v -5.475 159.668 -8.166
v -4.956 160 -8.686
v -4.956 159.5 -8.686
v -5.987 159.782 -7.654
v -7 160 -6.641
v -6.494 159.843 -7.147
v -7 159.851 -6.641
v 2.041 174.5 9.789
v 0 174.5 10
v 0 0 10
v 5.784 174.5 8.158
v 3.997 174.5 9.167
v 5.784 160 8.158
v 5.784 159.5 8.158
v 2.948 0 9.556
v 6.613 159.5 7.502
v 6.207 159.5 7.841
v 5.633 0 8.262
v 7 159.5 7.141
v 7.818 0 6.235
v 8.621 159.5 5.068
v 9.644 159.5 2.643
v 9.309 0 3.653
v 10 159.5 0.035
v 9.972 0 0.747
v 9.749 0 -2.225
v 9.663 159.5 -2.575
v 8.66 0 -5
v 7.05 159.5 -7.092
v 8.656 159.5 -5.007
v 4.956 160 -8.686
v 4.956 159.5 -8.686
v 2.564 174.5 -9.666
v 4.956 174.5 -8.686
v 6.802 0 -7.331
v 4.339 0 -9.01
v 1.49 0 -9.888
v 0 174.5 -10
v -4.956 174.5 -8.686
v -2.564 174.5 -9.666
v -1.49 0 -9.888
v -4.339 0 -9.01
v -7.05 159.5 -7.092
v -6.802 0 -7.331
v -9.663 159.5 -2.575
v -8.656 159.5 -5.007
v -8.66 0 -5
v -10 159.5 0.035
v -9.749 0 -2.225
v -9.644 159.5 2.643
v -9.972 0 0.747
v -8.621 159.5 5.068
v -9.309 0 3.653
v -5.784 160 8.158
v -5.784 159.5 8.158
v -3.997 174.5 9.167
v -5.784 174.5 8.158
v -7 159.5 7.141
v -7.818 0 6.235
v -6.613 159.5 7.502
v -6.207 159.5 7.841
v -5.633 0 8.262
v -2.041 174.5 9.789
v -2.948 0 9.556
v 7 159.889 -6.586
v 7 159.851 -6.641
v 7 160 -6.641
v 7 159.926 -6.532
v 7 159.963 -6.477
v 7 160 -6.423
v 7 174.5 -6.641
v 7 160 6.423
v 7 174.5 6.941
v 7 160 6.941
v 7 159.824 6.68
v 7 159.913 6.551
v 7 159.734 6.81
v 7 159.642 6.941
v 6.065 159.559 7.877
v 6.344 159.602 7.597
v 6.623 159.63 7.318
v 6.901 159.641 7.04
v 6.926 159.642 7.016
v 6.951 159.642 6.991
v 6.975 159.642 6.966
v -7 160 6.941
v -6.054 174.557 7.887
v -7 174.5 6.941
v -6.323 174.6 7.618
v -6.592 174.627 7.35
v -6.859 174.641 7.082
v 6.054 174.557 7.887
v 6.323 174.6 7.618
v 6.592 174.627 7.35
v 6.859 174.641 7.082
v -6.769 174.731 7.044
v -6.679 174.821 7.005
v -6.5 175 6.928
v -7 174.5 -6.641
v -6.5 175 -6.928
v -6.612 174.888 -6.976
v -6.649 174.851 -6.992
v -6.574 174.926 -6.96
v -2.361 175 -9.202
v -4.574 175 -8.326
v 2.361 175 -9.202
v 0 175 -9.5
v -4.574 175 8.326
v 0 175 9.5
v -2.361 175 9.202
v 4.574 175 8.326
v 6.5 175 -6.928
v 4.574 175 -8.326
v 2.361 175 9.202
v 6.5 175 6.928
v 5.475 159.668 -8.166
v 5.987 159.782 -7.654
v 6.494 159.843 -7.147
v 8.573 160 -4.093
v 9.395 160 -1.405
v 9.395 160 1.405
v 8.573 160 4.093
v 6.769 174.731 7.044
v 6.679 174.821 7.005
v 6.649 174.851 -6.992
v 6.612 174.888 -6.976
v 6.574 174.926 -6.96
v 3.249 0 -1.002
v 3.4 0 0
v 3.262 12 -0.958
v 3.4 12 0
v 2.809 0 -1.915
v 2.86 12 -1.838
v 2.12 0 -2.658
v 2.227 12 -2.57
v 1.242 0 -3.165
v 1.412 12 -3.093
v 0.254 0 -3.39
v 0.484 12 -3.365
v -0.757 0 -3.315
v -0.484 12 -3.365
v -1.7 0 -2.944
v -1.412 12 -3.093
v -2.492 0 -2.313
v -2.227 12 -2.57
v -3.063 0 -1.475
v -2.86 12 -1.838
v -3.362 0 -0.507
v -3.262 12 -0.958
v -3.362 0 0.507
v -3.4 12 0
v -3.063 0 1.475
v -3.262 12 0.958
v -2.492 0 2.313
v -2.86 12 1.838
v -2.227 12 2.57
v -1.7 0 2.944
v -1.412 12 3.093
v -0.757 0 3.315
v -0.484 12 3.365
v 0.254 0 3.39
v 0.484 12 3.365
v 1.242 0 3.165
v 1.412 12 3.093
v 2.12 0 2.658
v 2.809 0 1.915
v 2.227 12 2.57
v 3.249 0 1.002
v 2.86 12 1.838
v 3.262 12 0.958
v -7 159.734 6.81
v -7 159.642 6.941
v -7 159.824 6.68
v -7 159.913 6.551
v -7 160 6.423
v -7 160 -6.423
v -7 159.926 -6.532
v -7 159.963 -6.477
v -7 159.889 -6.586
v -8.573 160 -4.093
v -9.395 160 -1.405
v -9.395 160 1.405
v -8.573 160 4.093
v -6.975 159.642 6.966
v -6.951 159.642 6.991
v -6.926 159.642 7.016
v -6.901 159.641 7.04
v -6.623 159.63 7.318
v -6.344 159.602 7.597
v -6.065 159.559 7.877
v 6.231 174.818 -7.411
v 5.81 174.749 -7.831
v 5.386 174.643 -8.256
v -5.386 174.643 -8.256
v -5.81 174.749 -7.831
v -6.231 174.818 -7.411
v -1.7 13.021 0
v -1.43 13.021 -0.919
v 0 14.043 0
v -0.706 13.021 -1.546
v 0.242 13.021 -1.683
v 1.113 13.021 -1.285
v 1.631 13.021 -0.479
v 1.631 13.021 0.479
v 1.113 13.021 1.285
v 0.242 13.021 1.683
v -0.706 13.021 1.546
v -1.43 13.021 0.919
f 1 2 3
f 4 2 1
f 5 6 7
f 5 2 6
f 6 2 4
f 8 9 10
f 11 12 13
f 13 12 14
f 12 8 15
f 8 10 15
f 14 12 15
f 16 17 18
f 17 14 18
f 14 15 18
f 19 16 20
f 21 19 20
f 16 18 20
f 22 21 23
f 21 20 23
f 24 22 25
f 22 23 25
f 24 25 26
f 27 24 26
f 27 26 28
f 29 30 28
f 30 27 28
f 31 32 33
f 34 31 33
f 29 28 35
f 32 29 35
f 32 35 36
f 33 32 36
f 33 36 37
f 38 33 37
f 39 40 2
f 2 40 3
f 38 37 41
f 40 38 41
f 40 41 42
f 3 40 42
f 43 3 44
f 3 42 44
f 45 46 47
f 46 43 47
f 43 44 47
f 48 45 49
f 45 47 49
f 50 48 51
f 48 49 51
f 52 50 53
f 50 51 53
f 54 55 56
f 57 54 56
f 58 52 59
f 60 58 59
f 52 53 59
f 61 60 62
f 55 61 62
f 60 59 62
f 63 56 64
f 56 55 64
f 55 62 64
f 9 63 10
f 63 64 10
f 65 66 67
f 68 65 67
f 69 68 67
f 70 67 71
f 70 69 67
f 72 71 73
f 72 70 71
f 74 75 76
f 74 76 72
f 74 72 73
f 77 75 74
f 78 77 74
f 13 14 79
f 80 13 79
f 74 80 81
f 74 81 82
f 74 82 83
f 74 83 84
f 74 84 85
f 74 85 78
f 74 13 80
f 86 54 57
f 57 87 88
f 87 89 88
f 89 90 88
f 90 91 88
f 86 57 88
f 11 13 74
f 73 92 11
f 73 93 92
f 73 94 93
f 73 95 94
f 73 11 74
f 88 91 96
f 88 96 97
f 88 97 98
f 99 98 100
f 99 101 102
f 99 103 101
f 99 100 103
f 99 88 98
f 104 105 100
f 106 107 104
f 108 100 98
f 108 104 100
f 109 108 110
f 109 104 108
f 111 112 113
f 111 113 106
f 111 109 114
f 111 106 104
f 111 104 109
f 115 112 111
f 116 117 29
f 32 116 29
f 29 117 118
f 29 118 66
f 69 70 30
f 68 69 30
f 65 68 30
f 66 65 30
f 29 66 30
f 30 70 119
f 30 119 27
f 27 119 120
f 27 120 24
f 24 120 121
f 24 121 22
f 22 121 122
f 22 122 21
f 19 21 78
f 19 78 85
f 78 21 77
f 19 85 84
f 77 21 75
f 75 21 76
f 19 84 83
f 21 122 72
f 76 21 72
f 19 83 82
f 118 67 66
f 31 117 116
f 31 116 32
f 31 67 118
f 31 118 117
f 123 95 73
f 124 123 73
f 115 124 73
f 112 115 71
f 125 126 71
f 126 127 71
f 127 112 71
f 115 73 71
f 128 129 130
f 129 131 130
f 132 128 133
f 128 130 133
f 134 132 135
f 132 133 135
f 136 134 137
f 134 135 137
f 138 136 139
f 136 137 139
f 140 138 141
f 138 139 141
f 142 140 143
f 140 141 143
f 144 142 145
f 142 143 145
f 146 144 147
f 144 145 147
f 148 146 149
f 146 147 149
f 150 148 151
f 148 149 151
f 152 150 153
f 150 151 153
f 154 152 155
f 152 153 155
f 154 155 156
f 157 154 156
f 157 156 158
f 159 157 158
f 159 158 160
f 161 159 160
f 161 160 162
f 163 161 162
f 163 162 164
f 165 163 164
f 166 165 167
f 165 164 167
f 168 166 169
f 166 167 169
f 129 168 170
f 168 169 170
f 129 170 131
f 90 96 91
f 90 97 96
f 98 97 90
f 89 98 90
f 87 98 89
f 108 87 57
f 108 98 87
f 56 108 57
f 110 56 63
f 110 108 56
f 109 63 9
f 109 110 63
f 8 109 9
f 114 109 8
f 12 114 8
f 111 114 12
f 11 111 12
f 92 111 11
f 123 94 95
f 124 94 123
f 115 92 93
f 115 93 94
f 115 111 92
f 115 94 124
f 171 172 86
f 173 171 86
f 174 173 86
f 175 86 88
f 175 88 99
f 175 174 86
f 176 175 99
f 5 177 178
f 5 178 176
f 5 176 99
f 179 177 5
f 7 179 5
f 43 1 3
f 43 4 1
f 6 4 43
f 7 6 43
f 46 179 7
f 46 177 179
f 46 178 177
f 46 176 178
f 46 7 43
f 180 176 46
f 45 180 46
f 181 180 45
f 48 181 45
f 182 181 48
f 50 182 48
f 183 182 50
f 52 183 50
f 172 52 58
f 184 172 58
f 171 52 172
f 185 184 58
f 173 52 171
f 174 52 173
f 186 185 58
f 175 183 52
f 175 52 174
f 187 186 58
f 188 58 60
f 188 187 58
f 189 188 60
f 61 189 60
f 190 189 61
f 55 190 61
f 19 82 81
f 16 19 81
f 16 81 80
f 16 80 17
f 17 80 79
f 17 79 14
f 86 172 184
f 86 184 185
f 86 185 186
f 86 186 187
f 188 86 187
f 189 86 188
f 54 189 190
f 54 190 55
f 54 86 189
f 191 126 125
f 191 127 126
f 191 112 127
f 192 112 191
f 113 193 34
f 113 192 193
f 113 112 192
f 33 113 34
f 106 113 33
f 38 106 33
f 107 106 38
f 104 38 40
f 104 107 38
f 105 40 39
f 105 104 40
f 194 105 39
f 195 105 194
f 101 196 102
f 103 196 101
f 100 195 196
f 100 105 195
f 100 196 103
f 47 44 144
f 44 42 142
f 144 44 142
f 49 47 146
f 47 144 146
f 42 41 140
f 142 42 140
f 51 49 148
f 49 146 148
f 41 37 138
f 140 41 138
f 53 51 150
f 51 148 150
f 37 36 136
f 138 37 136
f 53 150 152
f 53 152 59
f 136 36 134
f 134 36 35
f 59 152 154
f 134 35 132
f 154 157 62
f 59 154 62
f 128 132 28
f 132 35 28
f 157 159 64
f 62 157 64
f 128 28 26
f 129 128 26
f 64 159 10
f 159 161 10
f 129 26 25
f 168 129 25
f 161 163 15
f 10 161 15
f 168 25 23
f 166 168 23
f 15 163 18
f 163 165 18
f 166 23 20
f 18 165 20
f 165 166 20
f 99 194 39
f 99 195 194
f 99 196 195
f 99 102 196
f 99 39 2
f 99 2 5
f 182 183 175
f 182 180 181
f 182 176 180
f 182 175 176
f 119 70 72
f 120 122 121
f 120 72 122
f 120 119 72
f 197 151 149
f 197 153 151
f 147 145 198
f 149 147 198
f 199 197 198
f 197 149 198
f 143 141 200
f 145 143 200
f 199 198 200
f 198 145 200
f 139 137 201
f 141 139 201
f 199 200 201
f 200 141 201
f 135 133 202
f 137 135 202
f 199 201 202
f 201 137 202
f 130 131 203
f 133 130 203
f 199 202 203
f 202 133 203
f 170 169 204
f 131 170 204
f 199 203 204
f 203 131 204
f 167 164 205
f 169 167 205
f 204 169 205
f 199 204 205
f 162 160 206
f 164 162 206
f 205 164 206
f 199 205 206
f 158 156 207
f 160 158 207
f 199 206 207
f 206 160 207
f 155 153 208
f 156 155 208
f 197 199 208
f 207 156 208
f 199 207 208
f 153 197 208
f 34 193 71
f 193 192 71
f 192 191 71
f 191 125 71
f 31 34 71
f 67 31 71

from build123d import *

# Parameters (mm, degrees)
SKETCH_1_R             = 10
EXTRUDE_1_DEPTH        = 175
SKETCH_2_W             = 7.534980856
SKETCH_2_H             = 25.851722938
CUT_EXTRUDE_1_DEPTH    = 15
HOLE_WIZARD_M8_1_D     = 6.8
HOLE_WIZARD_M8_1_DEPTH = 12
HOLE_WIZARD_M8_1_TIP   = 2.042926105
CHAMFER_1_SIZE         = 0.5
CHAMFER_4_SIZE         = 0.2
CHAMFER_5_SIZE         = 0.5
CHAMFER_2_SIZE         = 0.5


with BuildPart() as part:
    # 스케치1 → 보스-돌출1 (new body)
    with BuildSketch(Plane(origin=(0, 0, 0), x_dir=(1, 0, 0), z_dir=(0, 1, 0))):
        with Locations(Location((0, 0, 0), (0, 0, 270))):
            Circle(SKETCH_1_R)
    extrude(amount=EXTRUDE_1_DEPTH)

    # 스케치2 → 컷-돌출1 (cut)
    with BuildSketch(Plane(origin=(0, 175, 0), x_dir=(1, 0, 0), z_dir=(0, 1, 0))):
        with Locations((-10.767490428, 0.520710059)):
            Rectangle(SKETCH_2_W, SKETCH_2_H)
        with Locations((10.767490428, 0.520710059)):
            Rectangle(SKETCH_2_W, SKETCH_2_H)
    extrude(amount=-CUT_EXTRUDE_1_DEPTH, mode=Mode.SUBTRACT)

    # M8 나사 구멍1
    with Locations(Plane(origin=(0, 0, 0), x_dir=(-1, 0, 0), z_dir=(0, -1, 0))):
        with Locations((0, 0)):
            Hole(HOLE_WIZARD_M8_1_D / 2, depth=HOLE_WIZARD_M8_1_DEPTH)
            with Locations((0, 0, -(HOLE_WIZARD_M8_1_DEPTH + HOLE_WIZARD_M8_1_TIP / 2))):  # 118° drill point
                Cone(0, HOLE_WIZARD_M8_1_D / 2, HOLE_WIZARD_M8_1_TIP, mode=Mode.SUBTRACT)

    # 모따기1
    chamfer_1_edges = [part.edges().sort_by_distance(p)[0] for p in [
        (0, 175, -10),
        (3.780589618, 175, 9.257815193),
        (7, 175, 0),
        (-7, 175, 0),
    ]]
    chamfer(chamfer_1_edges, length=CHAMFER_1_SIZE)

    # 모따기4
    # the kernel refuses this chamfer: 14.141428429, 0.2 mm, written as the material it takes off along each edge
    with BuildSketch(Plane(origin=(-7, 179.872714198, 7.141428429), x_dir=(0.7673746516372044, 0, 0.6411989894133326), z_dir=(0, -1, 0))) as chamfer_4_piece_1:
        with BuildLine():
            Line((1.58509174, 0), (-CHAMFER_4_SIZE * 0.641198989413, -CHAMFER_4_SIZE * 0.767374651637))
            Line((-CHAMFER_4_SIZE * 0.641198989413, -CHAMFER_4_SIZE * 0.767374651637), (0, 0))
            ThreePointArc((0, 0), (1.074309981, 0.027485583), (1.58509174, 0))
        make_face()
    extrude(amount=19.872714198, mode=Mode.SUBTRACT)
    with BuildSketch(Plane(origin=(7, 179.872714198, 7.141428429), x_dir=(-0.7673746516372026, 0, 0.6411989894133348), z_dir=(0, -1, 0))) as chamfer_4_piece_2:
        with BuildLine():
            Line((1.58509174, 0), (-CHAMFER_4_SIZE * 0.641198989413, CHAMFER_4_SIZE * 0.767374651637))
            Line((-CHAMFER_4_SIZE * 0.641198989413, CHAMFER_4_SIZE * 0.767374651637), (0, 0))
            ThreePointArc((0, 0), (1.074309981, -0.027485583), (1.58509174, 0))
        make_face()
    extrude(amount=19.872714198, mode=Mode.SUBTRACT)

    # 모따기5
    # the kernel refuses this chamfer: 35.353571071, 0.5 mm, written as the material it takes off along each edge
    with BuildSketch(Plane(origin=(7, 184.418230147, -7.141428429), x_dir=(-0.7979254789483874, 0, -0.6027561115782952), z_dir=(0, -1, 0))) as chamfer_5_piece_1:
        with BuildLine():
            Line((2.561877444, 0), (-CHAMFER_5_SIZE * 0.602756111578, -CHAMFER_5_SIZE * 0.797925478948))
            Line((-CHAMFER_5_SIZE * 0.602756111578, -CHAMFER_5_SIZE * 0.797925478948), (0, 0))
            ThreePointArc((0, 0), (1.978478429, 0.058021773), (2.561877444, 0))
        make_face()
    extrude(amount=24.418230147, mode=Mode.SUBTRACT)
    with BuildSketch(Plane(origin=(-7, 184.418230147, -7.141428429), x_dir=(0.797925478948387, 0, -0.6027561115782961), z_dir=(0, -1, 0))) as chamfer_5_piece_2:
        with BuildLine():
            Line((2.561877444, 0), (-CHAMFER_5_SIZE * 0.602756111578, CHAMFER_5_SIZE * 0.797925478948))
            Line((-CHAMFER_5_SIZE * 0.602756111578, CHAMFER_5_SIZE * 0.797925478948), (0, 0))
            ThreePointArc((0, 0), (1.978478429, -0.058021773), (2.561877444, 0))
        make_face()
    extrude(amount=24.418230147, mode=Mode.SUBTRACT)

    # 모따기2
    # the kernel refuses this chamfer: 0.5 mm, written as the material it takes off along each edge
    with BuildSketch(Plane(origin=(0, 160, 0), x_dir=(-0.6999999999999962, 0, 0.7141428428542888), z_dir=(0.7141428428542888, 0, 0.6999999999999962))) as chamfer_2_piece_1_section:
        Polygon((10, CHAMFER_2_SIZE), (10 - CHAMFER_2_SIZE, 0), (10, 0), align=None)
    chamfer_2_piece_1 = revolve(axis=Axis((0, 160, 0), (0, -1, 0)), revolution_arc=113.236333046, mode=Mode.PRIVATE)
    chamfer_2_piece_1 = split(chamfer_2_piece_1, bisect_by=Plane(origin=(-7, 160, 0), z_dir=(-1, 0, 0)), keep=Keep.TOP, mode=Mode.PRIVATE)
    add(chamfer_2_piece_1, mode=Mode.SUBTRACT)
    with BuildSketch(Plane(origin=(0, 160, 0), x_dir=(-0.6999999999999962, 0, 0.7141428428542888), z_dir=(0.7141428428542888, 0, 0.6999999999999962))) as chamfer_2_piece_2_section:
        Polygon((10, CHAMFER_2_SIZE), (10 - CHAMFER_2_SIZE, 0), (10, 0), align=None)
    chamfer_2_piece_2 = revolve(axis=Axis((0, 160, 0), (0, -1, 0)), revolution_arc=113.236333046, mode=Mode.PRIVATE)
    chamfer_2_piece_2 = split(chamfer_2_piece_2, bisect_by=Plane(origin=(-6.970714214, 160, 6.970714214), z_dir=(-0.7071067811840911, 0, 0.707106781189004)), keep=Keep.TOP, mode=Mode.PRIVATE)
    add(chamfer_2_piece_2, mode=Mode.SUBTRACT)
    with BuildSketch(Plane(origin=(0, 160, 0), x_dir=(-0.6999999999999962, 0, 0.7141428428542888), z_dir=(0.7141428428542888, 0, 0.6999999999999962))) as chamfer_2_piece_3_section:
        Polygon((10, CHAMFER_2_SIZE), (10 - CHAMFER_2_SIZE, 0), (10, 0), align=None)
    chamfer_2_piece_3 = revolve(axis=Axis((0, 160, 0), (0, -1, 0)), revolution_arc=113.236333046, mode=Mode.PRIVATE)
    chamfer_2_piece_3 = split(chamfer_2_piece_3, bisect_by=Plane(origin=(-6.820714214, 160, -6.820714214), z_dir=(-0.707106781186502, 0, -0.707106781186593)), keep=Keep.TOP, mode=Mode.PRIVATE)
    add(chamfer_2_piece_3, mode=Mode.SUBTRACT)
    with BuildSketch(Plane(origin=(0, 160, 0), x_dir=(0.38004811354694096, 0, -0.9249667190712385), z_dir=(-0.9249667190712385, 0, -0.38004811354694096))) as chamfer_2_piece_4_section:
        Polygon((10, CHAMFER_2_SIZE), (10 - CHAMFER_2_SIZE, 0), (10, 0), align=None)
    chamfer_2_piece_4 = revolve(axis=Axis((0, 160, 0), (0, -1, 0)), revolution_arc=113.236333046, mode=Mode.PRIVATE)
    chamfer_2_piece_4 = split(chamfer_2_piece_4, bisect_by=Plane(origin=(7, 160, 0), z_dir=(1, 0, 0)), keep=Keep.TOP, mode=Mode.PRIVATE)
    add(chamfer_2_piece_4, mode=Mode.SUBTRACT)
    with BuildSketch(Plane(origin=(0, 160, 0), x_dir=(0.38004811354694096, 0, -0.9249667190712385), z_dir=(-0.9249667190712385, 0, -0.38004811354694096))) as chamfer_2_piece_5_section:
        Polygon((10, CHAMFER_2_SIZE), (10 - CHAMFER_2_SIZE, 0), (10, 0), align=None)
    chamfer_2_piece_5 = revolve(axis=Axis((0, 160, 0), (0, -1, 0)), revolution_arc=113.236333046, mode=Mode.PRIVATE)
    chamfer_2_piece_5 = split(chamfer_2_piece_5, bisect_by=Plane(origin=(6.820714214, 160, -6.820714214), z_dir=(0.707106781186502, 0, -0.707106781186593)), keep=Keep.TOP, mode=Mode.PRIVATE)
    add(chamfer_2_piece_5, mode=Mode.SUBTRACT)
    with BuildSketch(Plane(origin=(0, 160, 0), x_dir=(0.38004811354694096, 0, -0.9249667190712385), z_dir=(-0.9249667190712385, 0, -0.38004811354694096))) as chamfer_2_piece_6_section:
        Polygon((10, CHAMFER_2_SIZE), (10 - CHAMFER_2_SIZE, 0), (10, 0), align=None)
    chamfer_2_piece_6 = revolve(axis=Axis((0, 160, 0), (0, -1, 0)), revolution_arc=113.236333046, mode=Mode.PRIVATE)
    chamfer_2_piece_6 = split(chamfer_2_piece_6, bisect_by=Plane(origin=(6.970714214, 160, 6.970714214), z_dir=(0.7071067811840911, 0, 0.707106781189004)), keep=Keep.TOP, mode=Mode.PRIVATE)
    add(chamfer_2_piece_6, mode=Mode.SUBTRACT)
    with BuildSketch(Plane(origin=(0, 160, 0), x_dir=(0.6999999999991152, 0, 0.7141428428551523), z_dir=(0.7141428428551523, 0, -0.6999999999991152))) as chamfer_2_piece_7_section:
        Polygon((10, CHAMFER_2_SIZE), (10 - CHAMFER_2_SIZE, 0), (10, 0), align=None)
    chamfer_2_piece_7 = revolve(axis=Axis((0, 160, 0), (0, -1, 0)), revolution_arc=16.458800605, mode=Mode.PRIVATE)
    chamfer_2_piece_7 = split(chamfer_2_piece_7, bisect_by=Plane(origin=(6.970714214, 160, 6.970714214), z_dir=(0.7071067811840911, 0, 0.707106781189004)), keep=Keep.TOP, mode=Mode.PRIVATE)
    add(chamfer_2_piece_7, mode=Mode.SUBTRACT)
    with BuildSketch(Plane(origin=(0, 160, 0), x_dir=(-0.6999999999991152, 0, 0.7141428428551523), z_dir=(-0.7141428428551523, 0, -0.6999999999991152))) as chamfer_2_piece_8_section:
        Polygon((10, -CHAMFER_2_SIZE), (10 - CHAMFER_2_SIZE, 0), (10, 0), align=None)
    chamfer_2_piece_8 = revolve(axis=Axis((0, 160, 0), (0, 1, 0)), revolution_arc=16.458800605, mode=Mode.PRIVATE)
    chamfer_2_piece_8 = split(chamfer_2_piece_8, bisect_by=Plane(origin=(-6.970714214, 160, 6.970714214), z_dir=(-0.7071067811840911, 0, 0.707106781189004)), keep=Keep.TOP, mode=Mode.PRIVATE)
    add(chamfer_2_piece_8, mode=Mode.SUBTRACT)


solid = part.part
